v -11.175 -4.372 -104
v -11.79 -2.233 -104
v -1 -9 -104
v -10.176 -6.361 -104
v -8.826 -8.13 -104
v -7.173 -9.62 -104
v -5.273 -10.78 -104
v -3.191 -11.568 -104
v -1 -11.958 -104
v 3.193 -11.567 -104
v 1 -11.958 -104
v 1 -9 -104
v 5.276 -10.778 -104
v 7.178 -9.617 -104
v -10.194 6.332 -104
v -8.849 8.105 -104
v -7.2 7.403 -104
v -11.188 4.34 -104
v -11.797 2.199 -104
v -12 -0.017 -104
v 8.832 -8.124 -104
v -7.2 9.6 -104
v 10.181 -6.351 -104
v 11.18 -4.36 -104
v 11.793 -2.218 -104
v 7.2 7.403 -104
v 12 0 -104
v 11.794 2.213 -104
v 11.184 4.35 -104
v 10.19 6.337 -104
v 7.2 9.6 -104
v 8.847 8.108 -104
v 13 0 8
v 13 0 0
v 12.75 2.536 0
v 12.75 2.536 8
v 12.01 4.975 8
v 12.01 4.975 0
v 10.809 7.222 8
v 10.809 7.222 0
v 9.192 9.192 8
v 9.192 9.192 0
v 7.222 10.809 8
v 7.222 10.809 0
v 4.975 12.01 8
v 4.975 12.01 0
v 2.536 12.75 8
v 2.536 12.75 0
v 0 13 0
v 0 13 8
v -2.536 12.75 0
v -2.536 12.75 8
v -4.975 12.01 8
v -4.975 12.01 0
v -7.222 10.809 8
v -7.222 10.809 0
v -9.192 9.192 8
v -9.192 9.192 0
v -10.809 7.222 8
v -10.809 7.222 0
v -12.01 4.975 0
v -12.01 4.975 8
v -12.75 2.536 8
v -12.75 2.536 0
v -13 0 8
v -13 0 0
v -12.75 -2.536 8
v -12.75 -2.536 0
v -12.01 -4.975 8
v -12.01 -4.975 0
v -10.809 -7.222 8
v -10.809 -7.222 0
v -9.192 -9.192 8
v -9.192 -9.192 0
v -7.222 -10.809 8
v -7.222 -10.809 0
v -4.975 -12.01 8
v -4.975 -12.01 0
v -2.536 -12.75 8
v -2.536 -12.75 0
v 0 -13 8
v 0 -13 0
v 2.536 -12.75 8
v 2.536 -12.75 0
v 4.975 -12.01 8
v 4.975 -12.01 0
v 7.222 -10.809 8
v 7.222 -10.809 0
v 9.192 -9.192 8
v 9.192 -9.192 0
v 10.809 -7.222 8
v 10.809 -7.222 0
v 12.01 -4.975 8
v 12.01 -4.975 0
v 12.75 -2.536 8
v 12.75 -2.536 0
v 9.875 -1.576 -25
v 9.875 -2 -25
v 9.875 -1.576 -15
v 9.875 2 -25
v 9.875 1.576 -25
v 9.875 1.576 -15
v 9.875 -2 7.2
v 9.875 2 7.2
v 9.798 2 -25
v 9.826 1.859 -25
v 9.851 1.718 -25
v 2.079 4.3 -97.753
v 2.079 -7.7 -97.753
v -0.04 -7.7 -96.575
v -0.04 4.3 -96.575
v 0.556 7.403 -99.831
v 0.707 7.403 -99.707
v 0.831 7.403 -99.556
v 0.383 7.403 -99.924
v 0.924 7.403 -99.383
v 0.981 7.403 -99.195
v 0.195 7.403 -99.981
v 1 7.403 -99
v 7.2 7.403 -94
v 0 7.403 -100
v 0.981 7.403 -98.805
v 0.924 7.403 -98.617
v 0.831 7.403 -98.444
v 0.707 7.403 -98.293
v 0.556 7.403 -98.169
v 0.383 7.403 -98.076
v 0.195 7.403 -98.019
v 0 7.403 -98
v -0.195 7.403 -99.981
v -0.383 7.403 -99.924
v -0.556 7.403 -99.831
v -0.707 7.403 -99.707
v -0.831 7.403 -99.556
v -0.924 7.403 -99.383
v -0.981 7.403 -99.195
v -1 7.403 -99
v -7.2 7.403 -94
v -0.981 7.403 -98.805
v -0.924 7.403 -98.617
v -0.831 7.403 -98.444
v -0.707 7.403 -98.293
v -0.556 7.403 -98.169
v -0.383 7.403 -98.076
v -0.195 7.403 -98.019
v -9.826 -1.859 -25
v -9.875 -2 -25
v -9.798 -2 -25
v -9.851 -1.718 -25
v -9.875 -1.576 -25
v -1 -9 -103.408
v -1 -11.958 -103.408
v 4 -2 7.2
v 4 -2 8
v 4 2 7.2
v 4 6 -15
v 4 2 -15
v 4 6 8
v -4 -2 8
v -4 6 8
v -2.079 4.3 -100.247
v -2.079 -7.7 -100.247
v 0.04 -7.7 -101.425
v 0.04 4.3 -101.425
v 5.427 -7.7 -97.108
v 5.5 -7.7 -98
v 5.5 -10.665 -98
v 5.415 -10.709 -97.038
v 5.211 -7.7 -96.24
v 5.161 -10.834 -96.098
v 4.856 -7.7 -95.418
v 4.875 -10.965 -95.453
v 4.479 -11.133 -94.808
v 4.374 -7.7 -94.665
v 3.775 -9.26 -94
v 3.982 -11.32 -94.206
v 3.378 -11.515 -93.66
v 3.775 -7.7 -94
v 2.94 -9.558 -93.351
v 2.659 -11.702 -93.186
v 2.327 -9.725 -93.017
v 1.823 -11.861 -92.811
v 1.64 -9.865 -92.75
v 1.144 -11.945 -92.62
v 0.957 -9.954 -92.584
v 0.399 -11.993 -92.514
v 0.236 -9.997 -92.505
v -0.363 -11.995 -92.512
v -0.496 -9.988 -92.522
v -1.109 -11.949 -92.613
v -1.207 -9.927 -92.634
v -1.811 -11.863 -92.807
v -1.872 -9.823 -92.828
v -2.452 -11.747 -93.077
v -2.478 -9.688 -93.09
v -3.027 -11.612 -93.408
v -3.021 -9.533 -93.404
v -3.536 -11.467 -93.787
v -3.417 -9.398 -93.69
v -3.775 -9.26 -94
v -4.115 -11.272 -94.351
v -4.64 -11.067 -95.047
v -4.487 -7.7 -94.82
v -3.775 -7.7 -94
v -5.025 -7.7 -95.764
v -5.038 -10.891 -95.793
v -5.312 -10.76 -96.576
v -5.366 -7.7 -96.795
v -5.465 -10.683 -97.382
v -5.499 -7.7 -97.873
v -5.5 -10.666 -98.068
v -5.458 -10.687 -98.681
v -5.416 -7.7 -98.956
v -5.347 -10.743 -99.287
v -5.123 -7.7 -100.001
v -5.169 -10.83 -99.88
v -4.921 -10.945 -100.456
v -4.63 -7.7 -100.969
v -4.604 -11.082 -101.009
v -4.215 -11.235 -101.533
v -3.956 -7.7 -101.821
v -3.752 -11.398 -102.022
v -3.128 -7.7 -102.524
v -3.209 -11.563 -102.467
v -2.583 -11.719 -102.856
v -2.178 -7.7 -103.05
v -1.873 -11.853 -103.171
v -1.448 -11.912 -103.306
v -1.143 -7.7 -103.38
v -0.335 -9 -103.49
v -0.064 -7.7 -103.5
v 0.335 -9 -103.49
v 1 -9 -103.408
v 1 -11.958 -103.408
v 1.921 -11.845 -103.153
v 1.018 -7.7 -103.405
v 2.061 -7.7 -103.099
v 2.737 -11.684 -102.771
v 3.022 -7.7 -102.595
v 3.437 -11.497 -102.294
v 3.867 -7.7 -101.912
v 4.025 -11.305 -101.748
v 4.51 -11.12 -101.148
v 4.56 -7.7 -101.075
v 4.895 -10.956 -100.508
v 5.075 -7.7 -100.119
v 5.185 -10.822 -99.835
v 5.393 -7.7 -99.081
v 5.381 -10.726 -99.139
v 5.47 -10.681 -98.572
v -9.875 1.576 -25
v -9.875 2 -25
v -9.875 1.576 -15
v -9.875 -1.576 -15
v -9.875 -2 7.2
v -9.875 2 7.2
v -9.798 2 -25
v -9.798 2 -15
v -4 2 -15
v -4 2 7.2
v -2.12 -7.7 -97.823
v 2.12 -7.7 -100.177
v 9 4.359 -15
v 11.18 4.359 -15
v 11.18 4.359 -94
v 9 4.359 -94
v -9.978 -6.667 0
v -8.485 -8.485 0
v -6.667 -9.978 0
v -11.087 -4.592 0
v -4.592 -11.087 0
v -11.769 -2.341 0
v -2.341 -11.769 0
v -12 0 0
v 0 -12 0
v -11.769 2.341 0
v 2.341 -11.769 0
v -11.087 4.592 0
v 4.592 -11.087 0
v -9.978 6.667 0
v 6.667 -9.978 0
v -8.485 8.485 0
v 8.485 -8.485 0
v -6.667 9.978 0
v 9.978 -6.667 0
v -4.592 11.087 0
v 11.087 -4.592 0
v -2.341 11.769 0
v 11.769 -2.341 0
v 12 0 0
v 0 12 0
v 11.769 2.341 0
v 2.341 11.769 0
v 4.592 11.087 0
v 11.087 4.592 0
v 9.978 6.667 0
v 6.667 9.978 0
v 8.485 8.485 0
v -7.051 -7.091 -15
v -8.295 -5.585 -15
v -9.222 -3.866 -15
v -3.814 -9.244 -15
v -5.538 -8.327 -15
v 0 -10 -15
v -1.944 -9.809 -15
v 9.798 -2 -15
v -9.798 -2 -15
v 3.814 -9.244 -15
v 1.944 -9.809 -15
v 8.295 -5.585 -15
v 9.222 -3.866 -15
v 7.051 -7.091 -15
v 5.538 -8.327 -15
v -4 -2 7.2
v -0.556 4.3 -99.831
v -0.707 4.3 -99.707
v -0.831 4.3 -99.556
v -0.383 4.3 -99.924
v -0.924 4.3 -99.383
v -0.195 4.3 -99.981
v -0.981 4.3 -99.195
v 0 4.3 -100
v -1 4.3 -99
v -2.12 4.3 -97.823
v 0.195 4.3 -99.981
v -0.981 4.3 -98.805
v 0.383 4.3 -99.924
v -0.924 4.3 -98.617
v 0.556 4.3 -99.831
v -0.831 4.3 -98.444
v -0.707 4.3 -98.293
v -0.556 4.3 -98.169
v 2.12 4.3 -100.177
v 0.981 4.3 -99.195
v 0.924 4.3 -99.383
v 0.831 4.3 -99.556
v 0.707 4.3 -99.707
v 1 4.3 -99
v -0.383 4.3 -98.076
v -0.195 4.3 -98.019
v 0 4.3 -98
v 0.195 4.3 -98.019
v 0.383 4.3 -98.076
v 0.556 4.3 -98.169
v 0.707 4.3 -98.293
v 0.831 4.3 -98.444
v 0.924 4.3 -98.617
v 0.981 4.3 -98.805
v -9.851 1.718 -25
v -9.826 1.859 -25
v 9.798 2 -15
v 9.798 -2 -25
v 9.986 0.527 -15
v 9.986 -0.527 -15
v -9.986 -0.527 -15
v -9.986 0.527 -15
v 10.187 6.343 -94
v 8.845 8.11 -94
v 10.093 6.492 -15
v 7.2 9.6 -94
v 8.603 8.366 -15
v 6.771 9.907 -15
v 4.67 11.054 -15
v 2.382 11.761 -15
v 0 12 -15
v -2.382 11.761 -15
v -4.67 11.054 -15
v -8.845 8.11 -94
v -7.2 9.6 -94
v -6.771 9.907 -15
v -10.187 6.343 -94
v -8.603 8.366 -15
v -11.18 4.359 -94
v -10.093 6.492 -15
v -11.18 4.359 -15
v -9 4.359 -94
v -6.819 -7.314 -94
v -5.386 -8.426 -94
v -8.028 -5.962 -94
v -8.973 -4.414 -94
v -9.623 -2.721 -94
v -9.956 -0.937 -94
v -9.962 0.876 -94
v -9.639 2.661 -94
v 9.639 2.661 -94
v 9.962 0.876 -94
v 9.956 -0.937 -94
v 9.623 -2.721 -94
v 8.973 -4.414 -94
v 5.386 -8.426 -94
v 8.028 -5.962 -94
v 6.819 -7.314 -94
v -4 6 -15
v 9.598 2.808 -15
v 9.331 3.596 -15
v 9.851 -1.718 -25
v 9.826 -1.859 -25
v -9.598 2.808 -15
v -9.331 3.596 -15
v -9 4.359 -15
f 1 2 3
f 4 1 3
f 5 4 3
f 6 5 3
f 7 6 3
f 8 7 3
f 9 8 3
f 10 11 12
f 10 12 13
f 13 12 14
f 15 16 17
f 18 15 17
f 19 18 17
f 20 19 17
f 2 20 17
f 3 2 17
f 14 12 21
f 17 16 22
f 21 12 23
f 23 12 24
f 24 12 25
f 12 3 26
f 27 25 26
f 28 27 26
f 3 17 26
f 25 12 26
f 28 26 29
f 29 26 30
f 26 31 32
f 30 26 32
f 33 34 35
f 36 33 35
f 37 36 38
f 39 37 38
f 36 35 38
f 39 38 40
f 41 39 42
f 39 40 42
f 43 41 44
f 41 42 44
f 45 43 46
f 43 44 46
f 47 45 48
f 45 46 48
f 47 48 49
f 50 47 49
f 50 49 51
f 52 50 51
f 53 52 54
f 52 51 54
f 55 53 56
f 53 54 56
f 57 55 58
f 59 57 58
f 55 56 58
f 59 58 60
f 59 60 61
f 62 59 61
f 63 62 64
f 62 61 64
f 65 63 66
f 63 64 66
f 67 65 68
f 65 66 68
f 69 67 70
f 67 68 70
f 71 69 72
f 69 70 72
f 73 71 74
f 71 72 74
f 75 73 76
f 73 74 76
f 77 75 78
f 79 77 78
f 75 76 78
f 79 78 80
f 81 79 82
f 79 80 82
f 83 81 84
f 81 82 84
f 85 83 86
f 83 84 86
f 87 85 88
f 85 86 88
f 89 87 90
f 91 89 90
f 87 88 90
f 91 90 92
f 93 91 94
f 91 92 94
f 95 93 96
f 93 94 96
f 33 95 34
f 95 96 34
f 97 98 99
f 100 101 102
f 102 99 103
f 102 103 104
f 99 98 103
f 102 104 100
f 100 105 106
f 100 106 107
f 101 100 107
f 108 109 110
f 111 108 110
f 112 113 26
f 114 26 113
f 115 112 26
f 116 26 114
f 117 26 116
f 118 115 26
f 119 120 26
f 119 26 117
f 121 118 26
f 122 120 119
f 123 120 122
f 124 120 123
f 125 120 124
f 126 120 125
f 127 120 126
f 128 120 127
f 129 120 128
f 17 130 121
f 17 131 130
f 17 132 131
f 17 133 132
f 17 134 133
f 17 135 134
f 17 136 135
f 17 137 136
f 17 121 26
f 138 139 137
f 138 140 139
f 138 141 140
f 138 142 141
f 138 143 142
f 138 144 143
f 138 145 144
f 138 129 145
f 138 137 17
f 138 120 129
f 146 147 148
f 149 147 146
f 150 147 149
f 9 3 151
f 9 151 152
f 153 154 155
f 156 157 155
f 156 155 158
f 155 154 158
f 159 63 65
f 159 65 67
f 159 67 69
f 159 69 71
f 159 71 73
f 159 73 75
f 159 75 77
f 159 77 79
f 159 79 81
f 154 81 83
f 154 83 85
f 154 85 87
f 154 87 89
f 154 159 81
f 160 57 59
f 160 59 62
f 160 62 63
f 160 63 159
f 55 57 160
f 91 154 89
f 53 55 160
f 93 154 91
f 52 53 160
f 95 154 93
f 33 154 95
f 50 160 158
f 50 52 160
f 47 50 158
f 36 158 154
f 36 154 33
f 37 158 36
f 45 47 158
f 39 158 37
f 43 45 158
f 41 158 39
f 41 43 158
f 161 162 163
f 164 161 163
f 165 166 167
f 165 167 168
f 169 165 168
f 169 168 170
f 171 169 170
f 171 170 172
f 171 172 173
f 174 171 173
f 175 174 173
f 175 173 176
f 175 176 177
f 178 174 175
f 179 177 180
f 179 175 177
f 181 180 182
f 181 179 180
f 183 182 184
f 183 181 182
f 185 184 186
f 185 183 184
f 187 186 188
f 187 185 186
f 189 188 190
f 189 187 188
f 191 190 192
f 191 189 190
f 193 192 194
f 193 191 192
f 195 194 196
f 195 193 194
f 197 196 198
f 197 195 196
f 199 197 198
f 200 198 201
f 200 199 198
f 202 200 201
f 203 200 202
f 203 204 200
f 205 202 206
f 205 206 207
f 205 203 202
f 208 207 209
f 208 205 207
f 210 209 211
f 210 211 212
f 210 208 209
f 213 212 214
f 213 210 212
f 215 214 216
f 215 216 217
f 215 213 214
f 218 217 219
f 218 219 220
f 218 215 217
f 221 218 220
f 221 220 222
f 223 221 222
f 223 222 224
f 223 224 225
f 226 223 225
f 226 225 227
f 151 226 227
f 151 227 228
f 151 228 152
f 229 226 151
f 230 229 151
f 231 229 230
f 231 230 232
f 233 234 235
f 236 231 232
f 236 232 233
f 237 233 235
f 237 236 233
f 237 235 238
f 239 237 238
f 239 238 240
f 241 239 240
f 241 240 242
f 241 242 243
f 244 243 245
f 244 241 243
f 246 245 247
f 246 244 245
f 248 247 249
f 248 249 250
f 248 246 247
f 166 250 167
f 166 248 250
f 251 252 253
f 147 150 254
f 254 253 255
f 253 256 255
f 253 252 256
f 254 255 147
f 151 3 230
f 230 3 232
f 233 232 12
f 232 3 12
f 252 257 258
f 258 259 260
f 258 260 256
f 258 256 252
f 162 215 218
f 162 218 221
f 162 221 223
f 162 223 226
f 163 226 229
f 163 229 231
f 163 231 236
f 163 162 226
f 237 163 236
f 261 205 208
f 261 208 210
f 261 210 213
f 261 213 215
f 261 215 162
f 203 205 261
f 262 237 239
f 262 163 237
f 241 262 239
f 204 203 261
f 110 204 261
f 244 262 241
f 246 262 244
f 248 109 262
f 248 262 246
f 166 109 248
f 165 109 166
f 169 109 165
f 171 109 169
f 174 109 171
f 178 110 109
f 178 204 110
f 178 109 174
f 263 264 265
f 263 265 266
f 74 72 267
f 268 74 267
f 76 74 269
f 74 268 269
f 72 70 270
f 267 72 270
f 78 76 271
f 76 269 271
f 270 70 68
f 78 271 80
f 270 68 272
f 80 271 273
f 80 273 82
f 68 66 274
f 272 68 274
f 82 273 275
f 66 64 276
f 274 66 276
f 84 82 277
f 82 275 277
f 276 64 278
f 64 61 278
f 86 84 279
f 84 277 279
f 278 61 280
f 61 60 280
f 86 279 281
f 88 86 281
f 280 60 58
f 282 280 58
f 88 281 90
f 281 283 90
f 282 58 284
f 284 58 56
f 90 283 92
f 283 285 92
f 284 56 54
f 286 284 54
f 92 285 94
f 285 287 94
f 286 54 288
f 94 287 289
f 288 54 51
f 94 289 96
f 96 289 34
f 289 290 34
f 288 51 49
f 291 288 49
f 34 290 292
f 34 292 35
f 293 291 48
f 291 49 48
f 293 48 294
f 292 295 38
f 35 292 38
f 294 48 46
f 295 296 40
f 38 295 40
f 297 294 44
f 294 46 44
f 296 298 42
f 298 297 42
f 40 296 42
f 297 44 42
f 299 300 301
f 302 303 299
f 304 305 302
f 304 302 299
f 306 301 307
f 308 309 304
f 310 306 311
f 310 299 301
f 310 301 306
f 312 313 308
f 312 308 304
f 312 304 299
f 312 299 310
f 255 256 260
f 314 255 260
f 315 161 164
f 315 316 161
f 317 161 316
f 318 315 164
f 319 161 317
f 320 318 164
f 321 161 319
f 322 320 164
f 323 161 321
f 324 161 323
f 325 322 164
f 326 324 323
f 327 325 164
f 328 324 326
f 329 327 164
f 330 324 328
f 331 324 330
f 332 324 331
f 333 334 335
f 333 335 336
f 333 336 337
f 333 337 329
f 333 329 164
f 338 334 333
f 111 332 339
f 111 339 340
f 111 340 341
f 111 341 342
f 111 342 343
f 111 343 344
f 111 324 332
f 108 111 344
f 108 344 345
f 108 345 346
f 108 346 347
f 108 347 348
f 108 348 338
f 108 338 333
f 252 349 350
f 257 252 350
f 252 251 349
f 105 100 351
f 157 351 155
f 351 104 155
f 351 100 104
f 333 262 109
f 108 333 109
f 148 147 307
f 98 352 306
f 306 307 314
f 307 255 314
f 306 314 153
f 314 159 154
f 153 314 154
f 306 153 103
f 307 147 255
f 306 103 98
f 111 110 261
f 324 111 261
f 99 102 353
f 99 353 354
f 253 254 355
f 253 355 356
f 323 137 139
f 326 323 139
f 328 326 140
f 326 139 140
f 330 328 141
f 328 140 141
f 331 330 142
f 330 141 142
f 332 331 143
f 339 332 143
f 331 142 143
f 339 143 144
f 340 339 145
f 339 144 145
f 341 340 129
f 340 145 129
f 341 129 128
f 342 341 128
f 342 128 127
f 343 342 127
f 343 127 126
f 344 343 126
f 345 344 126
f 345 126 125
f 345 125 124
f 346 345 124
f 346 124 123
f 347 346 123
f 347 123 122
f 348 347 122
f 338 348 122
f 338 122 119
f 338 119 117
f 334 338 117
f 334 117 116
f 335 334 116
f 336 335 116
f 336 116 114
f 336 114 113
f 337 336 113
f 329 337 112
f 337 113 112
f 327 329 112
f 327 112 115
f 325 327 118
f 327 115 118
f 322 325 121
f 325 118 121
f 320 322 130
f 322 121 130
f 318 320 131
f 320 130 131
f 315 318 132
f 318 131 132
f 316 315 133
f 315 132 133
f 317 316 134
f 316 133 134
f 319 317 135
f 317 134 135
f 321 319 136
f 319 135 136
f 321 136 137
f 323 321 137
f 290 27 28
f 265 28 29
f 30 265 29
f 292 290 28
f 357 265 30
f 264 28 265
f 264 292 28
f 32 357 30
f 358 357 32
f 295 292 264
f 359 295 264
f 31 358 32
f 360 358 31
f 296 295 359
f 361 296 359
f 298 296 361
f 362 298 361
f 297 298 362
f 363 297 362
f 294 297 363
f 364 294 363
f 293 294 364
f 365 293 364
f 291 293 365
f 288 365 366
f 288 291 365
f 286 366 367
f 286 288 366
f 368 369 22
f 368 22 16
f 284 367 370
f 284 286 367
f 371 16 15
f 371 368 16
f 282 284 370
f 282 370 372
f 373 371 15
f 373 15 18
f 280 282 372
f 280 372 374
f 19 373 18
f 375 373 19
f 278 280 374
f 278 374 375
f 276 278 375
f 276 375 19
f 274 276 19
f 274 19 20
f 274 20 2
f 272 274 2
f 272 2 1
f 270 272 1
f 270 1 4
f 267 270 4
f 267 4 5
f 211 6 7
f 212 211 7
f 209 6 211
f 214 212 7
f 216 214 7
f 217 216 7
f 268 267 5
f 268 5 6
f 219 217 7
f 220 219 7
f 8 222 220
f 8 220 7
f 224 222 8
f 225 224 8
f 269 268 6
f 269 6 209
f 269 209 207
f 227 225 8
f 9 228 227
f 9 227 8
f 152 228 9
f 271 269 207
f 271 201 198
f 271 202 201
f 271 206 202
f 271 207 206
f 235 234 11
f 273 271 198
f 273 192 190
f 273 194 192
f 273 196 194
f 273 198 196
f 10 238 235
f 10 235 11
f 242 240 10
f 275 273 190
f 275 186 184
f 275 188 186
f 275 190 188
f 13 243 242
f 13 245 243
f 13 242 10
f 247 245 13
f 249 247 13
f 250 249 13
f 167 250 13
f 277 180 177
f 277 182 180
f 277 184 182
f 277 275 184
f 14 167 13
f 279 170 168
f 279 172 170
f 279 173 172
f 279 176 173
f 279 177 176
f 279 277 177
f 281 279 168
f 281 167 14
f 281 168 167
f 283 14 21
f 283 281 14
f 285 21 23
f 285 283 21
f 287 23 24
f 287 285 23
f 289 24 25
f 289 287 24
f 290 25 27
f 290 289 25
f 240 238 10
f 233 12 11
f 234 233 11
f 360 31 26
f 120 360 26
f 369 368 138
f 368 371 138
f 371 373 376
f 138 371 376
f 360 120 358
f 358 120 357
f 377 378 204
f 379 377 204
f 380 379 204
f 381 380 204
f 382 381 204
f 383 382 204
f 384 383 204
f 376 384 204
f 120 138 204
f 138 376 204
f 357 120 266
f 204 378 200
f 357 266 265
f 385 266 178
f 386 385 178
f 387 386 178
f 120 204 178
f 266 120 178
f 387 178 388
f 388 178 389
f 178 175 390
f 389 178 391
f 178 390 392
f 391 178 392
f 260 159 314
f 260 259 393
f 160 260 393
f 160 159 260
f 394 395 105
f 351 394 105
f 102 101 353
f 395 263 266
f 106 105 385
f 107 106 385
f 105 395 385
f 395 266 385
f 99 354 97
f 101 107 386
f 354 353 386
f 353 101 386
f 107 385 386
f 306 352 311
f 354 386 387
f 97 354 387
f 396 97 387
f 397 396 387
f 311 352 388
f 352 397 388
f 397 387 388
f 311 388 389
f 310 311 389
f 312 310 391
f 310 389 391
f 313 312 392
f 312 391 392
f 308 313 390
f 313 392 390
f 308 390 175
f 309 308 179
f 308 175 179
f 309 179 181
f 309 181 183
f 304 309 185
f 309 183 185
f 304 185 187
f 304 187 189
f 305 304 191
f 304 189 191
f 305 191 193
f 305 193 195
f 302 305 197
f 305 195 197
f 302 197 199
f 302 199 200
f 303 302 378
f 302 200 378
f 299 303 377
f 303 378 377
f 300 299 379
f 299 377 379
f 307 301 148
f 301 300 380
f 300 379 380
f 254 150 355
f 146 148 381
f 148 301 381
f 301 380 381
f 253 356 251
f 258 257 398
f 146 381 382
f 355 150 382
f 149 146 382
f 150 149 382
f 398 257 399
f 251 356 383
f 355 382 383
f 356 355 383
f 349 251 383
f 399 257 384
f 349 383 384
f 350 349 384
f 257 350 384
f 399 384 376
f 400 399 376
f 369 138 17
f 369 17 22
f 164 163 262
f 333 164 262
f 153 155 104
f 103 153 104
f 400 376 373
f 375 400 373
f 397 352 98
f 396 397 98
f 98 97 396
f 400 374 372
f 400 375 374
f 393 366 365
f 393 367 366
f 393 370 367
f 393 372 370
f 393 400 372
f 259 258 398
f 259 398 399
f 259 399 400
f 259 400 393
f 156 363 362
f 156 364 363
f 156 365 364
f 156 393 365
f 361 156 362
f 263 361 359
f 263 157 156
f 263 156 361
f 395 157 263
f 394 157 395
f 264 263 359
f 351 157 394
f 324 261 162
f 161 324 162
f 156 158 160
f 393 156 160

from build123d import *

# Parameters (mm, degrees)
F0_R      = 12
F1_DEPTH  = 104
F2_R      = 13
F3_DEPTH  = 8
F5_DEPTH  = 25
F8_DEPTH  = 79
F10_DEPTH = 10.001
F11_W     = 2
F11_H     = 5
F12_DEPTH = 6
F14_R     = 5.5
F15_DEPTH = 5.301
F16_W     = 5.875
F16_H     = 4
F17_DEPTH = 0.8
F18_R     = 1
F19_DEPTH = 20.4037756377
F21_DEPTH = 12


with BuildPart() as f1:
    # F0 (on Top) → F1 (new body)
    with BuildSketch(Plane.XY):
        Circle(F0_R)
    extrude(amount=-F1_DEPTH)

    # F2 (on face) → F3 (join)
    with BuildSketch(Plane.XY):
        Circle(F2_R)
    extrude(amount=F3_DEPTH)

    # F4 (on Top) → F5 (cut, symmetric)
    with BuildSketch(Plane.XY):
        Polygon((-4, 2), (-9.875, 2), (-9.875, -2), (9.875, -2), (9.875, 2), (4, 2), (4, 6), (-4, 6), align=None)
    extrude(amount=F5_DEPTH, both=True, mode=Mode.SUBTRACT)

    # F7 (on offset) → F8 (cut)
    with BuildSketch(Plane(origin=(0, 0, -94), x_dir=(1, 0, 0), z_dir=(0, 0, -1))):
        with BuildLine():
            Line((12.2474487139, -4.3588989435), (9, -4.3588989435))
            ThreePointArc((9, -4.3588989435), (0, 10), (-9, -4.3588989435))
            Line((-9, -4.3588989435), (-12.2474487139, -4.3588989435))
            ThreePointArc((-12.2474487139, -4.3588989435), (0, -13), (12.2474487139, -4.3588989435))
        make_face()
    extrude(amount=-F8_DEPTH, mode=Mode.SUBTRACT)

    # F9 (on offset) → F10 (cut, through all)
    with BuildSketch(Plane(origin=(0, 0, -94), x_dir=(1, 0, 0), z_dir=(0, 0, -1))):
        with BuildLine():
            Line((7.2, -7.4027756377), (-7.2, -7.4027756377))
            Line((-7.2, -7.4027756377), (-7.2, -10.8240473022))
            ThreePointArc((-7.2, -10.8240473022), (0, -13), (7.2, -10.8240473022))
            Line((7.2, -10.8240473022), (7.2, -7.4027756377))
        make_face()
    extrude(amount=F10_DEPTH, mode=Mode.SUBTRACT)

    # F11 (on face) → F12 (cut)
    with BuildSketch(Plane(origin=(0, 0, -104), x_dir=(1, 0, 0), z_dir=(0, 0, -1))):
        with Locations((0, 11.5)):
            Rectangle(F11_W, F11_H)
    extrude(amount=-F12_DEPTH, mode=Mode.SUBTRACT)

    # F14 (on offset) → F15 (cut, through all)
    with BuildSketch(Plane.XZ.offset(7.7)):
        with Locations((0, -98)):
            Circle(F14_R)
    extrude(amount=F15_DEPTH, mode=Mode.SUBTRACT)

    # F16 (on face) → F17 (join)
    with BuildSketch(Plane.XY.offset(8)):
        with Locations((-6.9375, 0)):
            Rectangle(F16_W, F16_H)
        with Locations((6.9375, 0)):
            Rectangle(F16_W, F16_H)
    extrude(amount=-F17_DEPTH)

    # F18 (on face) → F19 (cut, through all)
    with BuildSketch(Plane(origin=(0, 7.4027756377, 0), x_dir=(-1, 0, 0), z_dir=(0, 1, 0))):
        with Locations((0, -99)):
            Circle(F18_R)
    extrude(amount=-F19_DEPTH, mode=Mode.SUBTRACT)

    # F20 (on face) → F21 (cut)
    with BuildSketch(Plane.XZ.offset(7.7)):
        Polygon((0.0404706976, -101.4245333825), (2.1199428503, -100.177218039), (2.0794721527, -97.7526846565), (-0.0404706976, -96.5754666175), (-2.1199428503, -97.822781961), (-2.0794721527, -100.2473153435), align=None)
    extrude(amount=-F21_DEPTH, mode=Mode.SUBTRACT)


solid = f1.part
